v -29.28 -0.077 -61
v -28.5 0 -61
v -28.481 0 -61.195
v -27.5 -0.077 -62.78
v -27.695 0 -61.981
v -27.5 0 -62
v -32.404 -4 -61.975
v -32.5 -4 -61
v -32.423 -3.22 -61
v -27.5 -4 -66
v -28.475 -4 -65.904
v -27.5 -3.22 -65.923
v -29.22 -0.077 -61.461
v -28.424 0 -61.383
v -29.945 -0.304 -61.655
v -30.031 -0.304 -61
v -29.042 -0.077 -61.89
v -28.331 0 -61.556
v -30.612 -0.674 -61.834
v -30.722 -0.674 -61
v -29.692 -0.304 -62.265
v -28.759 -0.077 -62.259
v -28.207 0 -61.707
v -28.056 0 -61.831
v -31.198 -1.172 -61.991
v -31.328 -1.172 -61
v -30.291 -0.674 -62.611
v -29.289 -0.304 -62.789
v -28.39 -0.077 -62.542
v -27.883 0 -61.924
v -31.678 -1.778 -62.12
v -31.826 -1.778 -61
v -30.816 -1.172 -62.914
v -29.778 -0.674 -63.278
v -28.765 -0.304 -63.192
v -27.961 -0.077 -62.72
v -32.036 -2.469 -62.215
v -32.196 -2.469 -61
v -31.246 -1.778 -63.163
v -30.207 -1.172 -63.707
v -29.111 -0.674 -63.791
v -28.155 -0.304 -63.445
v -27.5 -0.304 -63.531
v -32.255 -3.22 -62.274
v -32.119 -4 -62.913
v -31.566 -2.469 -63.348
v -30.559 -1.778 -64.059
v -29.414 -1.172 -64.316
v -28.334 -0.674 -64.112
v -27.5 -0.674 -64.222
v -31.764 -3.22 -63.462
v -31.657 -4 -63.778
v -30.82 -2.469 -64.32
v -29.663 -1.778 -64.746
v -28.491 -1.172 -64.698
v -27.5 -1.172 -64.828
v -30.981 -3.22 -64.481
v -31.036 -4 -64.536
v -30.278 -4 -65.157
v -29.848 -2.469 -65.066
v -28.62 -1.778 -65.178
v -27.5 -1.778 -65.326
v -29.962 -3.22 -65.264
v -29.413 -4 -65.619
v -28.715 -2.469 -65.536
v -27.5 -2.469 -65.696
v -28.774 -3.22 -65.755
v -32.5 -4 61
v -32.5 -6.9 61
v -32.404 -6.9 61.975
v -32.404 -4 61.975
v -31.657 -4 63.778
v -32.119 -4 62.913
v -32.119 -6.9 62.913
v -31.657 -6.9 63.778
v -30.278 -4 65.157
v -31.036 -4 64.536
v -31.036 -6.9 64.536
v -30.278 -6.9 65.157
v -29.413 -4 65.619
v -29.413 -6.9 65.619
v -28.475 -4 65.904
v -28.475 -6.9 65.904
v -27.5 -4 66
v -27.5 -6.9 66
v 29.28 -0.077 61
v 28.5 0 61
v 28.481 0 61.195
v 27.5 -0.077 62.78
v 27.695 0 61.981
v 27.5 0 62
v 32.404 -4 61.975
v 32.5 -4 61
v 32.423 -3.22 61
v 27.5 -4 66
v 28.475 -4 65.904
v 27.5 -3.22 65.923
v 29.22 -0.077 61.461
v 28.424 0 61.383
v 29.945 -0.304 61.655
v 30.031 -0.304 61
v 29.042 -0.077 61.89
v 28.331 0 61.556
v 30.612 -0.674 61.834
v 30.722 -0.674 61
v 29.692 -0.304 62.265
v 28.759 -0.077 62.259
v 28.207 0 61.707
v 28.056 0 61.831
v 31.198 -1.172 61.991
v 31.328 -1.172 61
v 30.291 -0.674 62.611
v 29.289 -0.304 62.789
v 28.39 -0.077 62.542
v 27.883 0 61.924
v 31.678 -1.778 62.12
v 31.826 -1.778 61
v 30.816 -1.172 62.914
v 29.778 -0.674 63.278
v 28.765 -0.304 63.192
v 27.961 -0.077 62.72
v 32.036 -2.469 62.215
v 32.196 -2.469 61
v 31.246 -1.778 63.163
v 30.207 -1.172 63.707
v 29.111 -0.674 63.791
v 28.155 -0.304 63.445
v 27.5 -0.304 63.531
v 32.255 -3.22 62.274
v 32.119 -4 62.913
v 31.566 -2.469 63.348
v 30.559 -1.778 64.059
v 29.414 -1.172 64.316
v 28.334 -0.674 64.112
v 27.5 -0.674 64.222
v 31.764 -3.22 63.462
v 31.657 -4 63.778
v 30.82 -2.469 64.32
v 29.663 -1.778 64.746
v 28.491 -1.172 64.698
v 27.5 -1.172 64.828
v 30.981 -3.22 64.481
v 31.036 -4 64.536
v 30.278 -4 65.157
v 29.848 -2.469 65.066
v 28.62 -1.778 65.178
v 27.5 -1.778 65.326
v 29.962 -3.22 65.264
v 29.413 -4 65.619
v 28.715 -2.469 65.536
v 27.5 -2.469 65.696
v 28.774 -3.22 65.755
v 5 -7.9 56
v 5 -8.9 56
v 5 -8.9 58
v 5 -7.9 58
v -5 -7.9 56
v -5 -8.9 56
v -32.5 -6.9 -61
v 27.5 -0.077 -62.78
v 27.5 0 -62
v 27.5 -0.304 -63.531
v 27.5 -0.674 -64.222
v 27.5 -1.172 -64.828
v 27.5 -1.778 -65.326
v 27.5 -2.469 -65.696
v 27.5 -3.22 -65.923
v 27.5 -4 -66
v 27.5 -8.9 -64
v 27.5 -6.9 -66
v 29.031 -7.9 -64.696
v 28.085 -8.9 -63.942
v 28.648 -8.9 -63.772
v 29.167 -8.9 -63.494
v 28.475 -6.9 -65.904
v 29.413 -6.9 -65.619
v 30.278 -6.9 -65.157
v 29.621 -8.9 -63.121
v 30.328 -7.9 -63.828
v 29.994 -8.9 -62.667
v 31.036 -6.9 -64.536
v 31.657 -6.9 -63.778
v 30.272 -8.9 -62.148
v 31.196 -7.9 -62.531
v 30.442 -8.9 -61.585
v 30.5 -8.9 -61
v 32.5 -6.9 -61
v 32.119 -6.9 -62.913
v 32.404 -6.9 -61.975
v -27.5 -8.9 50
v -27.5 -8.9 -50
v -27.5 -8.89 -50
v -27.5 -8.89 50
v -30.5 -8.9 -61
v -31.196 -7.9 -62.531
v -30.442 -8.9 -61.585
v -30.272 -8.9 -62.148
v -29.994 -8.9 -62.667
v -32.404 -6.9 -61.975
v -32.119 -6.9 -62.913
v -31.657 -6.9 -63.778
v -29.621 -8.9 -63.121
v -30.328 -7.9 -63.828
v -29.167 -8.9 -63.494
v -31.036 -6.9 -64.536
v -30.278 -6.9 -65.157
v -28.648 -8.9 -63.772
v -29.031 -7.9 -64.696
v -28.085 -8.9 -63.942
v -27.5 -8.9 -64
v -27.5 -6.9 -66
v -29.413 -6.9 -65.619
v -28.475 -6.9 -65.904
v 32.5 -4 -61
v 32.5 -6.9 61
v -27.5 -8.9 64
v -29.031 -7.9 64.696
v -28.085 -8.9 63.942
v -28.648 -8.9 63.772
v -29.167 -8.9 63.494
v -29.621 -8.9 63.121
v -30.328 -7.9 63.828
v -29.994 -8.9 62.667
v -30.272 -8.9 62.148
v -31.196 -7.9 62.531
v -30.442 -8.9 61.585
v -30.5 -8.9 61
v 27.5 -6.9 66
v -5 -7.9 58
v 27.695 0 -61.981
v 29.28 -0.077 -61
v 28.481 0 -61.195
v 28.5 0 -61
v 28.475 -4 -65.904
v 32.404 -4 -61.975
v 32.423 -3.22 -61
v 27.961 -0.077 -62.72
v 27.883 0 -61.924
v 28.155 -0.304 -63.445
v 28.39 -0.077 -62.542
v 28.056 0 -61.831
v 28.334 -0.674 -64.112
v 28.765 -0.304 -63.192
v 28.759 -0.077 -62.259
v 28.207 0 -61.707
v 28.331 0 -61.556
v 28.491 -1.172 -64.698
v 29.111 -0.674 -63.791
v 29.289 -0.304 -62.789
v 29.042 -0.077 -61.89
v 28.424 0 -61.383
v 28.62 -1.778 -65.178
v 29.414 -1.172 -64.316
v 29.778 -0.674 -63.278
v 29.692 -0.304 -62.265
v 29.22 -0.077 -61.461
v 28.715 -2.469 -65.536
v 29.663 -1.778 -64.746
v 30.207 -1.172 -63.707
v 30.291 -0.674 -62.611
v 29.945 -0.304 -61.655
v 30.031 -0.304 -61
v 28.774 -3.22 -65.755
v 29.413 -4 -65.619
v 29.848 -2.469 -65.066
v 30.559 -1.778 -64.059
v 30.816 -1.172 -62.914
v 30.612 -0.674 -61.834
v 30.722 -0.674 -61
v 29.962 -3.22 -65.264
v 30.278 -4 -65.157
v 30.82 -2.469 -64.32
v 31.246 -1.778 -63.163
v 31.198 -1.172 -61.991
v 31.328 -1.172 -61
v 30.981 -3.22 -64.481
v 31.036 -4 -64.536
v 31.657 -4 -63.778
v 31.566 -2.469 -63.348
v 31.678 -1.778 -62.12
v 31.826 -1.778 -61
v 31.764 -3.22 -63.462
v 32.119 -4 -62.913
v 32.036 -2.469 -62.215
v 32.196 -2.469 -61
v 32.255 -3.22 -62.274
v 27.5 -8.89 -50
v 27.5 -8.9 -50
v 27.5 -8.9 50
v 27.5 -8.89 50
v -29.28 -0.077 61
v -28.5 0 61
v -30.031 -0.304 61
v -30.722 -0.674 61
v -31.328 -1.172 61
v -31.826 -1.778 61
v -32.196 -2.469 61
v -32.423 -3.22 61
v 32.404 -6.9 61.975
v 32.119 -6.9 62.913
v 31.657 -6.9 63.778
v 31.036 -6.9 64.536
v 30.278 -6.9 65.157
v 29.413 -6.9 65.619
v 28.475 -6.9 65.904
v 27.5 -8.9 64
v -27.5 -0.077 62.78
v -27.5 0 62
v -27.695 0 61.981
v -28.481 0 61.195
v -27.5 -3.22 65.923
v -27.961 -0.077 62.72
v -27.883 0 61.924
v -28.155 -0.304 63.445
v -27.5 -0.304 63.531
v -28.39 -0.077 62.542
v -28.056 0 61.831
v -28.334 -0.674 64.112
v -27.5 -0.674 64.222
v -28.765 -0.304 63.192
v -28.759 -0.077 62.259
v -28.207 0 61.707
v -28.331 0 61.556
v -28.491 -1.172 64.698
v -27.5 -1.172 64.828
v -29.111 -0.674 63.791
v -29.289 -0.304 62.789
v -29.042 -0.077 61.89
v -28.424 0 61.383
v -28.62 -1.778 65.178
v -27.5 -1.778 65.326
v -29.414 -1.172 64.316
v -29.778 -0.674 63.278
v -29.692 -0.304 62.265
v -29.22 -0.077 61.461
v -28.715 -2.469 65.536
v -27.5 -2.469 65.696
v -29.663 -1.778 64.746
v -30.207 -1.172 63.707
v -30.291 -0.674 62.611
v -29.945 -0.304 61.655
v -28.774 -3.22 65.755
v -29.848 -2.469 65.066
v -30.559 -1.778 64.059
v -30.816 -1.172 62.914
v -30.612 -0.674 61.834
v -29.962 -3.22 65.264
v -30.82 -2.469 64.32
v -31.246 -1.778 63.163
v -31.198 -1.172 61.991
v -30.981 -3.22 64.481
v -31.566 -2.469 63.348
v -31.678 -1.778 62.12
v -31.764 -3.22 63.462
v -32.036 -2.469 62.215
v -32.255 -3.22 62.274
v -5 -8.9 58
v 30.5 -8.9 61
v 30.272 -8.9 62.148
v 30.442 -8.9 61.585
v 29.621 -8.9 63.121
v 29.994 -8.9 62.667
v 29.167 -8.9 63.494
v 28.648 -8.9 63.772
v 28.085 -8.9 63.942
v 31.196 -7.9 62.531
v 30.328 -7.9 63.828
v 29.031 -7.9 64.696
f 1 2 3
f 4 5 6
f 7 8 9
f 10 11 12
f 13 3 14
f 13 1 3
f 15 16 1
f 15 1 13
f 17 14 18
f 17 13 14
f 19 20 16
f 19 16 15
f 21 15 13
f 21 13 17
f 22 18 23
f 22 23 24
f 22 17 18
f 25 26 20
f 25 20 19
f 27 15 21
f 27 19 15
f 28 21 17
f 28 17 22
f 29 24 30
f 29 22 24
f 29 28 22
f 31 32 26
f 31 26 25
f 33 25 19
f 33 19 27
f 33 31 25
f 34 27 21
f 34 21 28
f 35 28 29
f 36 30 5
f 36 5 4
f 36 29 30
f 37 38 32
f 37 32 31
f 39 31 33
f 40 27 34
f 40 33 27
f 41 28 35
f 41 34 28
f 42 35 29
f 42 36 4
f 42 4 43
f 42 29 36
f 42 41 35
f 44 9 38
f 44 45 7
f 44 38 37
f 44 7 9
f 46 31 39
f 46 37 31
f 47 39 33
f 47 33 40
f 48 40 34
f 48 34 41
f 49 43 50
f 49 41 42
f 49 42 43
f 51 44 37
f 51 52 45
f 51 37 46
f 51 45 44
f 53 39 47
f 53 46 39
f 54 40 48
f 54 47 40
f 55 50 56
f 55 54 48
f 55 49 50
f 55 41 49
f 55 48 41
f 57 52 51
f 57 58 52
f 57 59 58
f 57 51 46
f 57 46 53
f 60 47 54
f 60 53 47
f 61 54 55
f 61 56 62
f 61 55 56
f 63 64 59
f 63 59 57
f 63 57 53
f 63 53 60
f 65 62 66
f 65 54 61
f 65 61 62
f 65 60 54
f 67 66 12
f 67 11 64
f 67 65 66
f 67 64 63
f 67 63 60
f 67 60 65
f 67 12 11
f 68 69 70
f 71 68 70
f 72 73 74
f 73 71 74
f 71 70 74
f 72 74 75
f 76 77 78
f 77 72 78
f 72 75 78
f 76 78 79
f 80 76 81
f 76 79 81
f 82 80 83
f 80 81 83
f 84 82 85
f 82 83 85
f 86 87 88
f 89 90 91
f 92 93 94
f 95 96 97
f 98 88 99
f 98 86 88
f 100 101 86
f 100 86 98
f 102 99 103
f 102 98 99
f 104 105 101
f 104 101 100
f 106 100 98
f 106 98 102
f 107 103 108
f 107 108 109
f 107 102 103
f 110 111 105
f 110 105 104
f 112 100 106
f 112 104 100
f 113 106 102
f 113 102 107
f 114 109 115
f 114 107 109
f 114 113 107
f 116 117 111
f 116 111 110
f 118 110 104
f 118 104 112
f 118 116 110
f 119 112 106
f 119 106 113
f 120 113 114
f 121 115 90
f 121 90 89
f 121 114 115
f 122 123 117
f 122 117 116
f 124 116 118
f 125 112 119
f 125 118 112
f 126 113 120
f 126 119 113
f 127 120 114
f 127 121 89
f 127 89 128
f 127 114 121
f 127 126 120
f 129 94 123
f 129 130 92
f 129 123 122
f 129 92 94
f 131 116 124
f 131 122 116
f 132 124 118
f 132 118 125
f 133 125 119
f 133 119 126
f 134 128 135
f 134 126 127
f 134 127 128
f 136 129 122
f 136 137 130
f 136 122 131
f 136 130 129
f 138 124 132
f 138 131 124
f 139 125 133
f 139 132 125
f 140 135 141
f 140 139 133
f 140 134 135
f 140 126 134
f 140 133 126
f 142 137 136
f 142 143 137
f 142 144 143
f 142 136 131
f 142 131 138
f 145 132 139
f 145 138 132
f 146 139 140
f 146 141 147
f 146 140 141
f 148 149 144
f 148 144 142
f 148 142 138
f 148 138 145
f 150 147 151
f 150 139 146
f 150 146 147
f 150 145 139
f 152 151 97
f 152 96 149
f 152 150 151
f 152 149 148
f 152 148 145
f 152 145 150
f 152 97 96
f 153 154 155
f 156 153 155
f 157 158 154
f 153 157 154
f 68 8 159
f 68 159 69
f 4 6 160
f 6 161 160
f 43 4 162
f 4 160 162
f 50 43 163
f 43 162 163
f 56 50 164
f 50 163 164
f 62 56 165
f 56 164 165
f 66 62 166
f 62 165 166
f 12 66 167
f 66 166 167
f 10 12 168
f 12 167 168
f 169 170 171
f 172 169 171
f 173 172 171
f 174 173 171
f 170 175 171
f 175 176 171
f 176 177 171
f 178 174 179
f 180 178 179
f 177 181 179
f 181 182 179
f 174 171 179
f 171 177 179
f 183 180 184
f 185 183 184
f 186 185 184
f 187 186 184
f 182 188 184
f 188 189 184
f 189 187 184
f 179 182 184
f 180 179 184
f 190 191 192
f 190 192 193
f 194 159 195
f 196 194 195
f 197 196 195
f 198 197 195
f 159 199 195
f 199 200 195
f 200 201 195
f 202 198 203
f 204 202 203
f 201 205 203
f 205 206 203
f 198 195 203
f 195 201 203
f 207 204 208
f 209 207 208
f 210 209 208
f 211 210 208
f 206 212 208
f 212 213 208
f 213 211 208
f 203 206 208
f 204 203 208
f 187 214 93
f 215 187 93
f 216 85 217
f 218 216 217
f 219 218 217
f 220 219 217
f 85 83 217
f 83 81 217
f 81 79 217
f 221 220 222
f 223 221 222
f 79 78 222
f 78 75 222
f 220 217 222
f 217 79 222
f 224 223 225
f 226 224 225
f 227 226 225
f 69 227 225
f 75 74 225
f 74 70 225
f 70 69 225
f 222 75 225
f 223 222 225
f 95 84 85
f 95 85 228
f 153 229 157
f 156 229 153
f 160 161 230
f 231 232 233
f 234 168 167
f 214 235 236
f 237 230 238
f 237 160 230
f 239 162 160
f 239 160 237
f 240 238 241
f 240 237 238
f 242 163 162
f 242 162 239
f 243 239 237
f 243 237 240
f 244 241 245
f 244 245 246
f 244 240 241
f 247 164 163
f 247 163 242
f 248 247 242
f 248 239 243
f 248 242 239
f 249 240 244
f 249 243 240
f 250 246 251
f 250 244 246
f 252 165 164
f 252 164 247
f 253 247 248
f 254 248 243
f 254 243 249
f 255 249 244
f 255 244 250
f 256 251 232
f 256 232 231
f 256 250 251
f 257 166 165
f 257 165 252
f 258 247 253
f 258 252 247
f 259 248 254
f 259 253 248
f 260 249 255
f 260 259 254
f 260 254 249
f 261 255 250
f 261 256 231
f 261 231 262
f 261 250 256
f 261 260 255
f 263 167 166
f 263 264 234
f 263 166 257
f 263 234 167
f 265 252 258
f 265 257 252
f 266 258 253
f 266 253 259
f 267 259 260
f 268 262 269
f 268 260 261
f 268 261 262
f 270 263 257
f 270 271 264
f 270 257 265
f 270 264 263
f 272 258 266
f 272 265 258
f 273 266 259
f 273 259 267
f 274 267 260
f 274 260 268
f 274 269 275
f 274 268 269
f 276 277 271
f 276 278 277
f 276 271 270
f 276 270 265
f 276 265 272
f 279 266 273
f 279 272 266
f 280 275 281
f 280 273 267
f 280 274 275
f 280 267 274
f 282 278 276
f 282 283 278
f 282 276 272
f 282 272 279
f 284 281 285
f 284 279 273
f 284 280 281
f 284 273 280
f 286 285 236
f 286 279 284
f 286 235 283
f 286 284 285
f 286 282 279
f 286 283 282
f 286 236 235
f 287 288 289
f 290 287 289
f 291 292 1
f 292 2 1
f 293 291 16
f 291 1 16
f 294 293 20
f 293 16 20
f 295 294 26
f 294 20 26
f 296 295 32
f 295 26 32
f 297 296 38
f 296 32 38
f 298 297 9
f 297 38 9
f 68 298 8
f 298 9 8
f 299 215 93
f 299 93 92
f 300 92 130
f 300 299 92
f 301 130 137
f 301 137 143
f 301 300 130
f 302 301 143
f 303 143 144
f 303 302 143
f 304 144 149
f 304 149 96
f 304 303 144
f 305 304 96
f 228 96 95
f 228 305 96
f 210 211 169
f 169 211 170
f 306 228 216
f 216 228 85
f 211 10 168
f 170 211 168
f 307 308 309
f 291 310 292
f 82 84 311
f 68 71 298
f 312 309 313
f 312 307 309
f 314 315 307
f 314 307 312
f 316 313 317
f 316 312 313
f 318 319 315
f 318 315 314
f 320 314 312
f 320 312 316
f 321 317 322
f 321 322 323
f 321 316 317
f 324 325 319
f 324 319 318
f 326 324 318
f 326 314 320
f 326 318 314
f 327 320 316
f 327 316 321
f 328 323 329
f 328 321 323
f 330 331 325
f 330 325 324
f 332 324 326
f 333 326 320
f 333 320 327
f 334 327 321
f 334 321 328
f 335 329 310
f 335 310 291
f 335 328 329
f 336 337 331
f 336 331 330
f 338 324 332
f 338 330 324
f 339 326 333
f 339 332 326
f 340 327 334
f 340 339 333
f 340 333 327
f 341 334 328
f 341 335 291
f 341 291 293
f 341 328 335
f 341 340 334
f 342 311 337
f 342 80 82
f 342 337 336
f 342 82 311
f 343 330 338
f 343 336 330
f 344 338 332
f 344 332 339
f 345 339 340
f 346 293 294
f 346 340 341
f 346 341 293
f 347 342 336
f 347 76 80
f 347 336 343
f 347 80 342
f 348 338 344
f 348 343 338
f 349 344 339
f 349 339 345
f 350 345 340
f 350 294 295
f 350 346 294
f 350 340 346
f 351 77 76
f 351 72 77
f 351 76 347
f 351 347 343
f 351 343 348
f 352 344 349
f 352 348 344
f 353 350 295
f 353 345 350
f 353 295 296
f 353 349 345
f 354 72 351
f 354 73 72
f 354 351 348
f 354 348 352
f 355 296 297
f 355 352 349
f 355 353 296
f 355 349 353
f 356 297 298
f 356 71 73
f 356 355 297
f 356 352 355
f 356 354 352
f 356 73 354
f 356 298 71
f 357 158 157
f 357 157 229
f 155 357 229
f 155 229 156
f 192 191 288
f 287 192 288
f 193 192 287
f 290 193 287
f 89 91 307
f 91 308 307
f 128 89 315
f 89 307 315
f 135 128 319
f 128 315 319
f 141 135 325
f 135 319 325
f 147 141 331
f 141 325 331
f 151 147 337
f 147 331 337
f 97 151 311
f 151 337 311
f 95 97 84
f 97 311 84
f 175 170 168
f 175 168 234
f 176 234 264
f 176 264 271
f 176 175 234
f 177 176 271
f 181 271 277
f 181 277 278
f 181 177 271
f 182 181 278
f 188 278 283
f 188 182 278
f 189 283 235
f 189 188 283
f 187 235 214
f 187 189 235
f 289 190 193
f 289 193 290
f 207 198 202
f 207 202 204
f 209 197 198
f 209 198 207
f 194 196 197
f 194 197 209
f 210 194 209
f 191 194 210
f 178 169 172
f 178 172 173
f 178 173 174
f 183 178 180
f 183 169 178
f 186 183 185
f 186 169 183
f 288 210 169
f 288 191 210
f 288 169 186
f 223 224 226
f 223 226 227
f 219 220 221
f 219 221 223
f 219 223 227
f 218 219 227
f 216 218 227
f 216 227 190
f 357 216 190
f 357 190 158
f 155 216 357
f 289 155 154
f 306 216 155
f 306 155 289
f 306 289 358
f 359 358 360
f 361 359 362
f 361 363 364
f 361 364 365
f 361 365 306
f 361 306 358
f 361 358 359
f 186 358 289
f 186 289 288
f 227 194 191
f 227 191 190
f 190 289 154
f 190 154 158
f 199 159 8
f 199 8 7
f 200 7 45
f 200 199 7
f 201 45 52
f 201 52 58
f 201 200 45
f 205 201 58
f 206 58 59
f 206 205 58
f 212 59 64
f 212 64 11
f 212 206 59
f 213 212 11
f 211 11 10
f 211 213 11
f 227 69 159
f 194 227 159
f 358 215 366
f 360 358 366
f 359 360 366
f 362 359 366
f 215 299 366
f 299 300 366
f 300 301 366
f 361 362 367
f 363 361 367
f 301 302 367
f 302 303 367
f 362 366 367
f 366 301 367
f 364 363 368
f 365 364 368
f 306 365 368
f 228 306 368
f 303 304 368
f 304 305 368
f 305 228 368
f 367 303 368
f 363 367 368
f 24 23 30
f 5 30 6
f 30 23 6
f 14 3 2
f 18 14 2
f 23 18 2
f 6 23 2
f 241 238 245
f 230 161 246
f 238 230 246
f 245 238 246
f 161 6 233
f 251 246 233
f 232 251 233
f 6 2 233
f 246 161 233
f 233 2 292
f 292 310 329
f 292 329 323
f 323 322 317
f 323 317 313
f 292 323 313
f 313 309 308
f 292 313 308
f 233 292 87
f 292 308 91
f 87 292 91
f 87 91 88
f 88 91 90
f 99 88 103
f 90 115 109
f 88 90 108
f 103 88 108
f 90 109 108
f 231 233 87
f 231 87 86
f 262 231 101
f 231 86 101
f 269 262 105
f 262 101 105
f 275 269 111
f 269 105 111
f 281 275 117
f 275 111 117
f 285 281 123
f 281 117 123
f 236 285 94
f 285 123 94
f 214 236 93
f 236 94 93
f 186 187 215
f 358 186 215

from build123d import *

# Parameters (mm, degrees)
F0_W     = 65
F0_H     = 132
F1_DEPTH = 8.9
F2_R     = 5
F3_R     = 4
F4_SIZE  = 2
F6_W     = 55
F6_H     = 100
F7_DEPTH = 0.01
F8_W     = 10
F8_H     = 2
F9_DEPTH = 1


with BuildPart() as f1:
    # F0 (on Front) → F1 (new body)
    with BuildSketch(Plane.XZ):
        Rectangle(F0_W, F0_H)
    extrude(amount=F1_DEPTH)

    # F2
    f2_edges = [f1.edges().sort_by_distance(p)[0] for p in [
        (-32.5, -4.45, 66),
        (32.5, -4.45, 66),
        (32.5, -4.45, -66),
        (-32.5, -4.45, -66),
    ]]
    fillet(f2_edges, radius=F2_R)

    # F3
    f3_edges = [f1.edges().sort_by_distance(p)[0] for p in [
        (32.5, 0, 0),
    ]]
    fillet(f3_edges, radius=F3_R)

    # F4
    f4_edges = [f1.edges().sort_by_distance(p)[0] for p in [
        (32.5, -8.9, 0),
    ]]
    chamfer(f4_edges, length=F4_SIZE)

    # F6 (on face) → F7 (cut)
    with BuildSketch(Plane.XZ.offset(8.9)):
        Rectangle(F6_W, F6_H)
    extrude(amount=-F7_DEPTH, mode=Mode.SUBTRACT)

    # F8 (on face) → F9 (cut)
    with BuildSketch(Plane.XZ.offset(8.9)):
        with Locations((0, 57)):
            Rectangle(F8_W, F8_H)
    extrude(amount=-F9_DEPTH, mode=Mode.SUBTRACT)


solid = f1.part
